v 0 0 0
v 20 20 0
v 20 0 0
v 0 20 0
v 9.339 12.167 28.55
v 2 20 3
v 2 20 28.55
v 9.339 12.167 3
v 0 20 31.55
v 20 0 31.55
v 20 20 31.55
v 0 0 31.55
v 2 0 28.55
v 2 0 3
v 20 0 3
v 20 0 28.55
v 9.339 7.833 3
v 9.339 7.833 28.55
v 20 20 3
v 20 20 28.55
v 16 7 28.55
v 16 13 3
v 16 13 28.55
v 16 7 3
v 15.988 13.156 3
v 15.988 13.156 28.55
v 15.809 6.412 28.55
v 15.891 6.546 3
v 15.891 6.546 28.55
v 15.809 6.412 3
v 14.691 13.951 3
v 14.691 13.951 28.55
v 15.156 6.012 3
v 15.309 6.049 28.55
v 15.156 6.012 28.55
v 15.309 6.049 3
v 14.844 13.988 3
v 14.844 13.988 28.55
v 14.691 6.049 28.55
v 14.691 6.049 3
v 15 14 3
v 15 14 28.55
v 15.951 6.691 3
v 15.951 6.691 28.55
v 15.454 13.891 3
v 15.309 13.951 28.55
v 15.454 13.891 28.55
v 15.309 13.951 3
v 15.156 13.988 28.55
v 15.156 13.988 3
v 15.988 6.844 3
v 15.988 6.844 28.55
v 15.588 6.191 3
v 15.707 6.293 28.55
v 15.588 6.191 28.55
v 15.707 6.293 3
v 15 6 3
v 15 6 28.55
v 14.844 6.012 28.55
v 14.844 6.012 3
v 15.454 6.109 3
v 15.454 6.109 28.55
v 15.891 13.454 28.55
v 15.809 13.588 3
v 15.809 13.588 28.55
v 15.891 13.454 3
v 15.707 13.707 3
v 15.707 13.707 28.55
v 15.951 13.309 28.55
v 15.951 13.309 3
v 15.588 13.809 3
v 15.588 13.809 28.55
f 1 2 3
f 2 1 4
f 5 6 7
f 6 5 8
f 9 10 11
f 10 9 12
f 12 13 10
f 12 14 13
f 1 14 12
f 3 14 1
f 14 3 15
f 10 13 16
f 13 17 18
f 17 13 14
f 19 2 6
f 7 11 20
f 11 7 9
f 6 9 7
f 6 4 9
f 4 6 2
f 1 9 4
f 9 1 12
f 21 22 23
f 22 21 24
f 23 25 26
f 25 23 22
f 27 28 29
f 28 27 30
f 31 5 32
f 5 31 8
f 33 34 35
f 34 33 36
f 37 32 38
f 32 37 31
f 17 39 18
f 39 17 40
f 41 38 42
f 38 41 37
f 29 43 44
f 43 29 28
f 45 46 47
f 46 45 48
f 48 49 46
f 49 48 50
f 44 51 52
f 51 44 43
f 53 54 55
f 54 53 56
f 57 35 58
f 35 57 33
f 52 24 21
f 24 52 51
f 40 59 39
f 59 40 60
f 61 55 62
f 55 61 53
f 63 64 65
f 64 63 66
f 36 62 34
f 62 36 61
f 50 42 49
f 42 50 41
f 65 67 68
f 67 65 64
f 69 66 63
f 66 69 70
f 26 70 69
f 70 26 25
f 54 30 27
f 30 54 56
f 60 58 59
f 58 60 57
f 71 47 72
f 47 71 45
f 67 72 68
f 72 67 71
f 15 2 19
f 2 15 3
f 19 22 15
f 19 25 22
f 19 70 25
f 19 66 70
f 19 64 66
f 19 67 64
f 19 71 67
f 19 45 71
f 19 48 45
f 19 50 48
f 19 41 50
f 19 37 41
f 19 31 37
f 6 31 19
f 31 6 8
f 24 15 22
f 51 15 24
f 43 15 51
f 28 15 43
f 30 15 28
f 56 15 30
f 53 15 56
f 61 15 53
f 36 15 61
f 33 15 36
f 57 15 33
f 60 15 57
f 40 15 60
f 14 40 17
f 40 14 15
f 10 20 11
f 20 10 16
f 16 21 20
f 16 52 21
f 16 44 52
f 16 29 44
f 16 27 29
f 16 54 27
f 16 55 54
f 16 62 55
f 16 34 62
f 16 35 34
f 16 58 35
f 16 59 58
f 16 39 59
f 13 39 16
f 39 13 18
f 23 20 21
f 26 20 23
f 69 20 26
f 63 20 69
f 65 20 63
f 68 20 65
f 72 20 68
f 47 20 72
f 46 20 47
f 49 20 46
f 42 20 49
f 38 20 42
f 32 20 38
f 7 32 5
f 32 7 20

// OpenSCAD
h=31.55;

hull() {
cube([2,2,h]);
translate([10,10,0]) cylinder(d=2,h=h, $fn=40);
translate([0,20-2,0]) cube([2,2,h]);
}
hull() {
translate([15,13,0]) cylinder(d=2,h=h, $fn=40);
translate([15,7,0]) cylinder(d=2,h=h, $fn=40);
translate([6,10,0]) cylinder(d=2,h=h, $fn=40);
}
cube([20,20,3]);
translate([0,0,h-3]) cube([20,20,3]);
